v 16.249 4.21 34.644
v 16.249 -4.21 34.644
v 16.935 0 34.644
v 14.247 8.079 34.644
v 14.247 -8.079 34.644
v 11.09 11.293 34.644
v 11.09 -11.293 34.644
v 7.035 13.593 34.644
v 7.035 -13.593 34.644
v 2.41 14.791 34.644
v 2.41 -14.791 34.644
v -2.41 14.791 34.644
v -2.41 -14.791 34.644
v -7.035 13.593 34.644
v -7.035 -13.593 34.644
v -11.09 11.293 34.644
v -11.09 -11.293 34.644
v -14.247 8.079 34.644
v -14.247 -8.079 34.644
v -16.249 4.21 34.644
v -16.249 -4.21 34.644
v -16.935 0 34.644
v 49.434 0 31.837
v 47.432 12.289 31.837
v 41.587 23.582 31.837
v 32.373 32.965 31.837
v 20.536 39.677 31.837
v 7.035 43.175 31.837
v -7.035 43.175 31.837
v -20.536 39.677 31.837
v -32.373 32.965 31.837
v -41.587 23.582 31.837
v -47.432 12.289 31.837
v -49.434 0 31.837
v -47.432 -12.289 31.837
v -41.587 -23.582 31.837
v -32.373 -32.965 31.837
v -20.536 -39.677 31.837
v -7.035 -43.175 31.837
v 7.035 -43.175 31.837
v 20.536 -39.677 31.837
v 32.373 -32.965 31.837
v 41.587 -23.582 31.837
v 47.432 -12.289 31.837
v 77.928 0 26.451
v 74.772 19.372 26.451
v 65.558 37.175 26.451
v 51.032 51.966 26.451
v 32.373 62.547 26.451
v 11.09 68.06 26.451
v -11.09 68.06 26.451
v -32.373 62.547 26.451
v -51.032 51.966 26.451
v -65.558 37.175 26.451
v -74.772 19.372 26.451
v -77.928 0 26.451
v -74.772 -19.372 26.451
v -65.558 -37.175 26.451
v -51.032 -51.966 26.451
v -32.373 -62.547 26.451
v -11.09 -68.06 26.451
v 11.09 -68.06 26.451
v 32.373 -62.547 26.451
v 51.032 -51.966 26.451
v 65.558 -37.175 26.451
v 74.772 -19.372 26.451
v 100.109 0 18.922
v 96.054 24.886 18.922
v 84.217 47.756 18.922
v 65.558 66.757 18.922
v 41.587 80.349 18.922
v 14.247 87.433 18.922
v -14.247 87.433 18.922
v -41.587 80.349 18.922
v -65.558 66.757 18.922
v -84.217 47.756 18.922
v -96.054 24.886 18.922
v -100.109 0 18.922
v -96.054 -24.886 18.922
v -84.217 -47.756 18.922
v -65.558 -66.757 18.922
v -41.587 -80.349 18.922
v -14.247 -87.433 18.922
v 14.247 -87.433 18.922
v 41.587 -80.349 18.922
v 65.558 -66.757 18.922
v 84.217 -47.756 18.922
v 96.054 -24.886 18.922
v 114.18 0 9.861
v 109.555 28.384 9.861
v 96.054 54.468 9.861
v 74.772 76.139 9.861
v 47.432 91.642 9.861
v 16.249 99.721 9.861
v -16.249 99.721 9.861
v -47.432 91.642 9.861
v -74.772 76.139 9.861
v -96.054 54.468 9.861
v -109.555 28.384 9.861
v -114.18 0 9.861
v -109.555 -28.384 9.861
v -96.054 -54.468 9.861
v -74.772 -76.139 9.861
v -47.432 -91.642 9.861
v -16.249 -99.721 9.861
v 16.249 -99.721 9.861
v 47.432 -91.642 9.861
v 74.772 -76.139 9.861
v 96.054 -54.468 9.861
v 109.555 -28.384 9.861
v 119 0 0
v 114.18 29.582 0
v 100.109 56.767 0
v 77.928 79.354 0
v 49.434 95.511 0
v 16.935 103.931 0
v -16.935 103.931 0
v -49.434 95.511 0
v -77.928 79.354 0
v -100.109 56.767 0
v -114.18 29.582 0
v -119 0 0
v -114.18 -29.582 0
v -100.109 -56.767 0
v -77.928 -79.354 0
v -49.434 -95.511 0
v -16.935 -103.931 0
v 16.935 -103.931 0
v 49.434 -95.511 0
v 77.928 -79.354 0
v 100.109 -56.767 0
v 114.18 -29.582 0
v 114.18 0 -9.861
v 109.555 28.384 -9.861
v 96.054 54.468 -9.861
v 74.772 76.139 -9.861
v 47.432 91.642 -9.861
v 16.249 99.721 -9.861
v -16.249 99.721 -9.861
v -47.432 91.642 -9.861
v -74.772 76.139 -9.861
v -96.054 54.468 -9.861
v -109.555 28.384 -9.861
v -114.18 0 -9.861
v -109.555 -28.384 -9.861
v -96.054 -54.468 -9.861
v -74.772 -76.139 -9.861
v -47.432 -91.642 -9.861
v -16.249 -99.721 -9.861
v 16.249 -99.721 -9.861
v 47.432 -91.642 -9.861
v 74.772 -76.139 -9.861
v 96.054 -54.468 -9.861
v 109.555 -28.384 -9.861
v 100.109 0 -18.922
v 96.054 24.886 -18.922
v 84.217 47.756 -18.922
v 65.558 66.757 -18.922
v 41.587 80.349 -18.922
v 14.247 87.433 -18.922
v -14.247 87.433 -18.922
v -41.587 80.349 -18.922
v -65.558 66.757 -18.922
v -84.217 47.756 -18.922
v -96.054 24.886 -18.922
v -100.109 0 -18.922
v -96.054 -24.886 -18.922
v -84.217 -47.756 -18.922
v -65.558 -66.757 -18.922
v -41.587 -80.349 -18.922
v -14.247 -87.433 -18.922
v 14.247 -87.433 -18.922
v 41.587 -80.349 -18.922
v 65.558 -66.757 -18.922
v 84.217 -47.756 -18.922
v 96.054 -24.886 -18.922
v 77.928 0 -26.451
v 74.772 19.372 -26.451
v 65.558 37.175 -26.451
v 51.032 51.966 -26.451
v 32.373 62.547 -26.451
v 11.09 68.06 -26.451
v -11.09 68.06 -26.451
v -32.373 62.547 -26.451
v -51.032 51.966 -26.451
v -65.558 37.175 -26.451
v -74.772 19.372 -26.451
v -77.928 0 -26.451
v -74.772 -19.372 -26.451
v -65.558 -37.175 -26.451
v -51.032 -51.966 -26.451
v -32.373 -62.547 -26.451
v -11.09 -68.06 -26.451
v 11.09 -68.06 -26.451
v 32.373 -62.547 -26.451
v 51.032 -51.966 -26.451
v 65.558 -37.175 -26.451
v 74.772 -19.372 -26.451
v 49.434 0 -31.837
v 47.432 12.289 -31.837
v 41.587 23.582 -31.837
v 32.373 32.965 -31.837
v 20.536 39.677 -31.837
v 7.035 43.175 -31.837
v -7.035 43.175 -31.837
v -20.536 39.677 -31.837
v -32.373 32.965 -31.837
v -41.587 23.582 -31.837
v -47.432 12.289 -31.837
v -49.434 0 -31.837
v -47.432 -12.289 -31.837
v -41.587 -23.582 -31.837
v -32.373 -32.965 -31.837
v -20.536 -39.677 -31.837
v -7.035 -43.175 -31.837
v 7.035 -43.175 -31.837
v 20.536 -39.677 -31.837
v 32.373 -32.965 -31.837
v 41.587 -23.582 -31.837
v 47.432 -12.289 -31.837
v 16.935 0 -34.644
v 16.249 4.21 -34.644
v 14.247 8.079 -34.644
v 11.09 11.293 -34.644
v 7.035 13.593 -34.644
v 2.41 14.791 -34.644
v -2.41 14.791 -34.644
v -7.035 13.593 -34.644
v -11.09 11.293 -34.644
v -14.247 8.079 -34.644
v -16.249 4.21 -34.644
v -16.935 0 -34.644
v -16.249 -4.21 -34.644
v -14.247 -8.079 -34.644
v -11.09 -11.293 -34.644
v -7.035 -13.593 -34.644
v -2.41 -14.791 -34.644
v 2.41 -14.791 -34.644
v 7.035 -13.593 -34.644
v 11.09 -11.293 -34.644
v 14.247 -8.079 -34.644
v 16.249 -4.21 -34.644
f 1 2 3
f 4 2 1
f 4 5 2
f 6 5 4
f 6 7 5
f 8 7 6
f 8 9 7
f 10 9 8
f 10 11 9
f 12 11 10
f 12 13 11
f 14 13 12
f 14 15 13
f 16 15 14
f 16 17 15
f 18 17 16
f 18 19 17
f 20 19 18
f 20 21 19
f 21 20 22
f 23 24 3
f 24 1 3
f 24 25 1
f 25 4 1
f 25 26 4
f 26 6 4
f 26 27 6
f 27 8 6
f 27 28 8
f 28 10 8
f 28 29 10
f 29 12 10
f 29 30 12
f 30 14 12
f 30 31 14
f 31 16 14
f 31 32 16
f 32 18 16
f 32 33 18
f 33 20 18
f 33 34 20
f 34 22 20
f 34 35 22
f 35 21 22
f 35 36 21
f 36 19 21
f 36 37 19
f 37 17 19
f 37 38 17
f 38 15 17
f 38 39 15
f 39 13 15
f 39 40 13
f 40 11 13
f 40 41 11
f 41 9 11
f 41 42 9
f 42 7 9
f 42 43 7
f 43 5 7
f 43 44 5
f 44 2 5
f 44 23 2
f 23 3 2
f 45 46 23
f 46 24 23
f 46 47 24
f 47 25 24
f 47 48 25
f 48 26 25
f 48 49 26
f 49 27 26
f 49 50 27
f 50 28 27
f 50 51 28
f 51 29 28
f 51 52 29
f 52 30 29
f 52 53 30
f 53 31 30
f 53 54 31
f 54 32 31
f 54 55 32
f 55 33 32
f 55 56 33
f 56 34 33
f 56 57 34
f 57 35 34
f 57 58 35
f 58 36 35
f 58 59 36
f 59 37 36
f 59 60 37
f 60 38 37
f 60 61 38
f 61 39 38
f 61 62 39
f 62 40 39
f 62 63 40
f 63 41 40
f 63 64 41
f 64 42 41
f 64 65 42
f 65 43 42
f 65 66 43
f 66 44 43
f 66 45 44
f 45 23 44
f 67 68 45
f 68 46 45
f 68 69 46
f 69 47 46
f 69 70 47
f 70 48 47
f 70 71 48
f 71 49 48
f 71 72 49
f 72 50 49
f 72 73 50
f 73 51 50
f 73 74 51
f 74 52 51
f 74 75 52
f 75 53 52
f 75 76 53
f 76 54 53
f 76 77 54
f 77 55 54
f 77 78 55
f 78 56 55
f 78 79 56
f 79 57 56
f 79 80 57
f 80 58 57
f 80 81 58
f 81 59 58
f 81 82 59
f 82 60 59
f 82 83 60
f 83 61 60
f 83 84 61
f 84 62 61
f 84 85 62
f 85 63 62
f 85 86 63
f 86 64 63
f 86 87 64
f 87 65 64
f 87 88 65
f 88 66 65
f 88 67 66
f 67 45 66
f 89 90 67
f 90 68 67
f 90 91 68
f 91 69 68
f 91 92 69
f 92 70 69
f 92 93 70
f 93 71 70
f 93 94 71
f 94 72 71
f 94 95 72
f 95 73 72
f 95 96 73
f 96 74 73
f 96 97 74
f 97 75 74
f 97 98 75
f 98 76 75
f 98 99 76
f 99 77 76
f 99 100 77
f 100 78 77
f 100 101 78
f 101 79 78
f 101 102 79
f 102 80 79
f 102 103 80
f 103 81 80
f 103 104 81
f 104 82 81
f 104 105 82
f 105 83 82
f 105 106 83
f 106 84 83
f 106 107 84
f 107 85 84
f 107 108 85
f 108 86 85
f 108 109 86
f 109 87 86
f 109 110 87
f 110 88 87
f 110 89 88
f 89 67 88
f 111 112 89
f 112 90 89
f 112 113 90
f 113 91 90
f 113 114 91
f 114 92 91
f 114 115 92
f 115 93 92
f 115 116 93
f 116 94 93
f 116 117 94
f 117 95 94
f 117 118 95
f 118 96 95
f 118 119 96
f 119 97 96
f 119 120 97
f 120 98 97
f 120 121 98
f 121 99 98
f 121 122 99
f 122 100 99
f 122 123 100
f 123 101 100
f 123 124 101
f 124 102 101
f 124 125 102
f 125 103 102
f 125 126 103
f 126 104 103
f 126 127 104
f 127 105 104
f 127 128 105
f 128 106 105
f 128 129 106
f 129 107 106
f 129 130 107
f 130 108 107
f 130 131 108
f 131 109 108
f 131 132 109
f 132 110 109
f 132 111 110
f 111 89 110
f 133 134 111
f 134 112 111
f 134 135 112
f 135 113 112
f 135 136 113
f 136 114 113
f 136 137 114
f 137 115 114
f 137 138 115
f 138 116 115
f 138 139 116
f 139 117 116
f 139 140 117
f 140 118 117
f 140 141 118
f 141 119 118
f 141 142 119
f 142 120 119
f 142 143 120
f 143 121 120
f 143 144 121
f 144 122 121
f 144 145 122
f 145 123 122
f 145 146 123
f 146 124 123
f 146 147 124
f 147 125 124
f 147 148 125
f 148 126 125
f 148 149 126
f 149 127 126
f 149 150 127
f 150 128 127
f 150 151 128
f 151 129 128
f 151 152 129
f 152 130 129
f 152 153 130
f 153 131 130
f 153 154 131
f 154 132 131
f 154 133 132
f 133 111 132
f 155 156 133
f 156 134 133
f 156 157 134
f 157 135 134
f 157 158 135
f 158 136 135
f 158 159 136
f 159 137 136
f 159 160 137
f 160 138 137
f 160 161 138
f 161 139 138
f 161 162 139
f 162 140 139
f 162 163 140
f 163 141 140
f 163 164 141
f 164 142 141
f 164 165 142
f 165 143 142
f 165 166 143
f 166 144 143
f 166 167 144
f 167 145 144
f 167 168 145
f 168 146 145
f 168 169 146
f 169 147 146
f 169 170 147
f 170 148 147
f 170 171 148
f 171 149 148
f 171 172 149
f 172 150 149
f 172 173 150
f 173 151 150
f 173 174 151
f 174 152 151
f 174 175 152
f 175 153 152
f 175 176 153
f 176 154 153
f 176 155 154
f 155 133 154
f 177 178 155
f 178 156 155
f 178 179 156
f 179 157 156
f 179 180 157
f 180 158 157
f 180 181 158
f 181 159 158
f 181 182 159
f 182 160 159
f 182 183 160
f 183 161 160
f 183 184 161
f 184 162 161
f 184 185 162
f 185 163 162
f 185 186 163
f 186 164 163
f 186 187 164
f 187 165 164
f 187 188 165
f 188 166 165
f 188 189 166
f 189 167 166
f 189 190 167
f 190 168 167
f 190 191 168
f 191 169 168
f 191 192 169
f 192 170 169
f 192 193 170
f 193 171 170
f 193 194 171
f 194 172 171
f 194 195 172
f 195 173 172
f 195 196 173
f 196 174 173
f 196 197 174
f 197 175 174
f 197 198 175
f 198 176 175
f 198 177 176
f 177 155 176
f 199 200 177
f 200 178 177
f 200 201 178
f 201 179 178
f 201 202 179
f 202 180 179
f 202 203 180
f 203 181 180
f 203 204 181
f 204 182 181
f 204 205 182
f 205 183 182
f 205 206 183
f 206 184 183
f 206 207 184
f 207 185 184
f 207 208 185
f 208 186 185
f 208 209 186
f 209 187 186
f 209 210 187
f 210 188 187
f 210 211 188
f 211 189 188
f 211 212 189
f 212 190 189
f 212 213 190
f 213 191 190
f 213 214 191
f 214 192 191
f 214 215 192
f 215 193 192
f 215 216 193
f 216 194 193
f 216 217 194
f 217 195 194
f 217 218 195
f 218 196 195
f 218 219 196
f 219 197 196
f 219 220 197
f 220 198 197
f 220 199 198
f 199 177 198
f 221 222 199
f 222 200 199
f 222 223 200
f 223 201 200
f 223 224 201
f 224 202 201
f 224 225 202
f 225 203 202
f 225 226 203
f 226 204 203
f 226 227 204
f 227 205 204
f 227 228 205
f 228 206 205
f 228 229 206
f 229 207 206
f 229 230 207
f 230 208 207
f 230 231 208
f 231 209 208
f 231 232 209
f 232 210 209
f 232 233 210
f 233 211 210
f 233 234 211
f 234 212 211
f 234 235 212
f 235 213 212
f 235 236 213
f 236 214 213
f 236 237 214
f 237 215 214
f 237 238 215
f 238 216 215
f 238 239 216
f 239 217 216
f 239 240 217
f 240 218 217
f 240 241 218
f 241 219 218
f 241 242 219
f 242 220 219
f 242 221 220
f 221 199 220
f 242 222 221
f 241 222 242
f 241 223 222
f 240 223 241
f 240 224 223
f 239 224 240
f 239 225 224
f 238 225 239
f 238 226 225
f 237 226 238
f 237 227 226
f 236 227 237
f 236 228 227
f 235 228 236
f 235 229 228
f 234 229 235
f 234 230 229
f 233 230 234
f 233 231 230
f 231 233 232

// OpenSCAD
// Generated by SolidPython 1.0.1 on 2020-07-29 00:46:53


scale(v = [17, 15, 5]) {
	sphere(r = 7);
}
/***********************************************
*********      SolidPython code:      **********
************************************************
 
# import packages: SolidPython
from solid import *
from solid.utils import *
from itertools import chain, combinations, permutations


class Resize:

    def __init__(self, scad_file):
        self.scad_file = scad_file
        #self.scad_file = import_scad(scad_file)
        # cone/cylinder param:
        self.r1 = 0
        self.r2 = 0
        self.h = 0
        # rectangular prism param:
        self.w = 0
        self.l = 0
        # ellipse param:
        self.r = 0

    # import OpenScad code (file name corresponds to shape)


    # classify shape + parameters
    def assign(self, param1, param2, param3):
        if self.scad_file == 'cone.scad':
            self.r1 = param1
            self.r2 = param2
            self.h = param3
        elif self.scad_file == 'cylinder.scad':
            self.r1 = param1
            self.r2 = param2
            self.h = param3
        elif self.scad_file == 'rectangularPrism.scad':
            self.h = param1
            self.l = param2
            self.w = param3
        else:
            self.r = param1
            self.h = param2

    # resize parameters
    def iterate(self):
        x = range(3, 20, 2)
        i = 1
        if self.scad_file == 'cone.scad':
            tempList = list(permutations(x, 2))
            for temp in tempList:
                param1 = temp[0]
                param2 = temp[1]
                filepath = 'produced_scad_files/' + 'cone' + str(param1) + '_' + str(param2) + '_' + '.scad'
                scad_render_to_file(cylinder(h=param1, r1=param2, r2=0), filepath)

        elif self.scad_file == 'cylinder.scad':
            tempList = list(permutations(x, 3))
            for temp in tempList:
                param1 = temp[0]
                param2 = temp[1]
                filepath = 'produced_scad_files/' + 'cylinder' + str(param1) + '_' + str(param2) + '_' + '.scad'
                scad_render_to_file(cylinder(h=param1, r1=param2, r2=param2), filepath)

        elif self.scad_file == 'rectangularPrism.scad':
            tempList = list(permutations(x, 3))
            for temp in tempList:
                param1 = temp[0]
                param2 = temp[1]
                param3 = temp[2]
                filepath = 'produced_scad_files/' + 'rectangularPrism' + str(param1) + '_' + str(param2) + '_' + str(
                    param3) + '.scad'
                scad_render_to_file(cube(size=(param1, param2, param3)), filepath)

        elif self.scad_file == 'ellipse.scad':
            tempList = list(permutations(x, 4))
            for temp in tempList:
                param1 = temp[0]
                param2 = temp[1]
                param3 = temp[2]
                param4 = temp[3]
                filepath = 'produced_scad_files/' + 'ellipse' + str(param1) + '_' + str(param2) + '_' + str(param3) + '_' + str(param4) + '.scad'
                scad_render_to_file(scale([param1, param2, param3])(sphere(r=param4)), filepath)

    def render_to_scadfile(self):
        scad_render_to_file(scad, 'example.scad') 
 
************************************************/
